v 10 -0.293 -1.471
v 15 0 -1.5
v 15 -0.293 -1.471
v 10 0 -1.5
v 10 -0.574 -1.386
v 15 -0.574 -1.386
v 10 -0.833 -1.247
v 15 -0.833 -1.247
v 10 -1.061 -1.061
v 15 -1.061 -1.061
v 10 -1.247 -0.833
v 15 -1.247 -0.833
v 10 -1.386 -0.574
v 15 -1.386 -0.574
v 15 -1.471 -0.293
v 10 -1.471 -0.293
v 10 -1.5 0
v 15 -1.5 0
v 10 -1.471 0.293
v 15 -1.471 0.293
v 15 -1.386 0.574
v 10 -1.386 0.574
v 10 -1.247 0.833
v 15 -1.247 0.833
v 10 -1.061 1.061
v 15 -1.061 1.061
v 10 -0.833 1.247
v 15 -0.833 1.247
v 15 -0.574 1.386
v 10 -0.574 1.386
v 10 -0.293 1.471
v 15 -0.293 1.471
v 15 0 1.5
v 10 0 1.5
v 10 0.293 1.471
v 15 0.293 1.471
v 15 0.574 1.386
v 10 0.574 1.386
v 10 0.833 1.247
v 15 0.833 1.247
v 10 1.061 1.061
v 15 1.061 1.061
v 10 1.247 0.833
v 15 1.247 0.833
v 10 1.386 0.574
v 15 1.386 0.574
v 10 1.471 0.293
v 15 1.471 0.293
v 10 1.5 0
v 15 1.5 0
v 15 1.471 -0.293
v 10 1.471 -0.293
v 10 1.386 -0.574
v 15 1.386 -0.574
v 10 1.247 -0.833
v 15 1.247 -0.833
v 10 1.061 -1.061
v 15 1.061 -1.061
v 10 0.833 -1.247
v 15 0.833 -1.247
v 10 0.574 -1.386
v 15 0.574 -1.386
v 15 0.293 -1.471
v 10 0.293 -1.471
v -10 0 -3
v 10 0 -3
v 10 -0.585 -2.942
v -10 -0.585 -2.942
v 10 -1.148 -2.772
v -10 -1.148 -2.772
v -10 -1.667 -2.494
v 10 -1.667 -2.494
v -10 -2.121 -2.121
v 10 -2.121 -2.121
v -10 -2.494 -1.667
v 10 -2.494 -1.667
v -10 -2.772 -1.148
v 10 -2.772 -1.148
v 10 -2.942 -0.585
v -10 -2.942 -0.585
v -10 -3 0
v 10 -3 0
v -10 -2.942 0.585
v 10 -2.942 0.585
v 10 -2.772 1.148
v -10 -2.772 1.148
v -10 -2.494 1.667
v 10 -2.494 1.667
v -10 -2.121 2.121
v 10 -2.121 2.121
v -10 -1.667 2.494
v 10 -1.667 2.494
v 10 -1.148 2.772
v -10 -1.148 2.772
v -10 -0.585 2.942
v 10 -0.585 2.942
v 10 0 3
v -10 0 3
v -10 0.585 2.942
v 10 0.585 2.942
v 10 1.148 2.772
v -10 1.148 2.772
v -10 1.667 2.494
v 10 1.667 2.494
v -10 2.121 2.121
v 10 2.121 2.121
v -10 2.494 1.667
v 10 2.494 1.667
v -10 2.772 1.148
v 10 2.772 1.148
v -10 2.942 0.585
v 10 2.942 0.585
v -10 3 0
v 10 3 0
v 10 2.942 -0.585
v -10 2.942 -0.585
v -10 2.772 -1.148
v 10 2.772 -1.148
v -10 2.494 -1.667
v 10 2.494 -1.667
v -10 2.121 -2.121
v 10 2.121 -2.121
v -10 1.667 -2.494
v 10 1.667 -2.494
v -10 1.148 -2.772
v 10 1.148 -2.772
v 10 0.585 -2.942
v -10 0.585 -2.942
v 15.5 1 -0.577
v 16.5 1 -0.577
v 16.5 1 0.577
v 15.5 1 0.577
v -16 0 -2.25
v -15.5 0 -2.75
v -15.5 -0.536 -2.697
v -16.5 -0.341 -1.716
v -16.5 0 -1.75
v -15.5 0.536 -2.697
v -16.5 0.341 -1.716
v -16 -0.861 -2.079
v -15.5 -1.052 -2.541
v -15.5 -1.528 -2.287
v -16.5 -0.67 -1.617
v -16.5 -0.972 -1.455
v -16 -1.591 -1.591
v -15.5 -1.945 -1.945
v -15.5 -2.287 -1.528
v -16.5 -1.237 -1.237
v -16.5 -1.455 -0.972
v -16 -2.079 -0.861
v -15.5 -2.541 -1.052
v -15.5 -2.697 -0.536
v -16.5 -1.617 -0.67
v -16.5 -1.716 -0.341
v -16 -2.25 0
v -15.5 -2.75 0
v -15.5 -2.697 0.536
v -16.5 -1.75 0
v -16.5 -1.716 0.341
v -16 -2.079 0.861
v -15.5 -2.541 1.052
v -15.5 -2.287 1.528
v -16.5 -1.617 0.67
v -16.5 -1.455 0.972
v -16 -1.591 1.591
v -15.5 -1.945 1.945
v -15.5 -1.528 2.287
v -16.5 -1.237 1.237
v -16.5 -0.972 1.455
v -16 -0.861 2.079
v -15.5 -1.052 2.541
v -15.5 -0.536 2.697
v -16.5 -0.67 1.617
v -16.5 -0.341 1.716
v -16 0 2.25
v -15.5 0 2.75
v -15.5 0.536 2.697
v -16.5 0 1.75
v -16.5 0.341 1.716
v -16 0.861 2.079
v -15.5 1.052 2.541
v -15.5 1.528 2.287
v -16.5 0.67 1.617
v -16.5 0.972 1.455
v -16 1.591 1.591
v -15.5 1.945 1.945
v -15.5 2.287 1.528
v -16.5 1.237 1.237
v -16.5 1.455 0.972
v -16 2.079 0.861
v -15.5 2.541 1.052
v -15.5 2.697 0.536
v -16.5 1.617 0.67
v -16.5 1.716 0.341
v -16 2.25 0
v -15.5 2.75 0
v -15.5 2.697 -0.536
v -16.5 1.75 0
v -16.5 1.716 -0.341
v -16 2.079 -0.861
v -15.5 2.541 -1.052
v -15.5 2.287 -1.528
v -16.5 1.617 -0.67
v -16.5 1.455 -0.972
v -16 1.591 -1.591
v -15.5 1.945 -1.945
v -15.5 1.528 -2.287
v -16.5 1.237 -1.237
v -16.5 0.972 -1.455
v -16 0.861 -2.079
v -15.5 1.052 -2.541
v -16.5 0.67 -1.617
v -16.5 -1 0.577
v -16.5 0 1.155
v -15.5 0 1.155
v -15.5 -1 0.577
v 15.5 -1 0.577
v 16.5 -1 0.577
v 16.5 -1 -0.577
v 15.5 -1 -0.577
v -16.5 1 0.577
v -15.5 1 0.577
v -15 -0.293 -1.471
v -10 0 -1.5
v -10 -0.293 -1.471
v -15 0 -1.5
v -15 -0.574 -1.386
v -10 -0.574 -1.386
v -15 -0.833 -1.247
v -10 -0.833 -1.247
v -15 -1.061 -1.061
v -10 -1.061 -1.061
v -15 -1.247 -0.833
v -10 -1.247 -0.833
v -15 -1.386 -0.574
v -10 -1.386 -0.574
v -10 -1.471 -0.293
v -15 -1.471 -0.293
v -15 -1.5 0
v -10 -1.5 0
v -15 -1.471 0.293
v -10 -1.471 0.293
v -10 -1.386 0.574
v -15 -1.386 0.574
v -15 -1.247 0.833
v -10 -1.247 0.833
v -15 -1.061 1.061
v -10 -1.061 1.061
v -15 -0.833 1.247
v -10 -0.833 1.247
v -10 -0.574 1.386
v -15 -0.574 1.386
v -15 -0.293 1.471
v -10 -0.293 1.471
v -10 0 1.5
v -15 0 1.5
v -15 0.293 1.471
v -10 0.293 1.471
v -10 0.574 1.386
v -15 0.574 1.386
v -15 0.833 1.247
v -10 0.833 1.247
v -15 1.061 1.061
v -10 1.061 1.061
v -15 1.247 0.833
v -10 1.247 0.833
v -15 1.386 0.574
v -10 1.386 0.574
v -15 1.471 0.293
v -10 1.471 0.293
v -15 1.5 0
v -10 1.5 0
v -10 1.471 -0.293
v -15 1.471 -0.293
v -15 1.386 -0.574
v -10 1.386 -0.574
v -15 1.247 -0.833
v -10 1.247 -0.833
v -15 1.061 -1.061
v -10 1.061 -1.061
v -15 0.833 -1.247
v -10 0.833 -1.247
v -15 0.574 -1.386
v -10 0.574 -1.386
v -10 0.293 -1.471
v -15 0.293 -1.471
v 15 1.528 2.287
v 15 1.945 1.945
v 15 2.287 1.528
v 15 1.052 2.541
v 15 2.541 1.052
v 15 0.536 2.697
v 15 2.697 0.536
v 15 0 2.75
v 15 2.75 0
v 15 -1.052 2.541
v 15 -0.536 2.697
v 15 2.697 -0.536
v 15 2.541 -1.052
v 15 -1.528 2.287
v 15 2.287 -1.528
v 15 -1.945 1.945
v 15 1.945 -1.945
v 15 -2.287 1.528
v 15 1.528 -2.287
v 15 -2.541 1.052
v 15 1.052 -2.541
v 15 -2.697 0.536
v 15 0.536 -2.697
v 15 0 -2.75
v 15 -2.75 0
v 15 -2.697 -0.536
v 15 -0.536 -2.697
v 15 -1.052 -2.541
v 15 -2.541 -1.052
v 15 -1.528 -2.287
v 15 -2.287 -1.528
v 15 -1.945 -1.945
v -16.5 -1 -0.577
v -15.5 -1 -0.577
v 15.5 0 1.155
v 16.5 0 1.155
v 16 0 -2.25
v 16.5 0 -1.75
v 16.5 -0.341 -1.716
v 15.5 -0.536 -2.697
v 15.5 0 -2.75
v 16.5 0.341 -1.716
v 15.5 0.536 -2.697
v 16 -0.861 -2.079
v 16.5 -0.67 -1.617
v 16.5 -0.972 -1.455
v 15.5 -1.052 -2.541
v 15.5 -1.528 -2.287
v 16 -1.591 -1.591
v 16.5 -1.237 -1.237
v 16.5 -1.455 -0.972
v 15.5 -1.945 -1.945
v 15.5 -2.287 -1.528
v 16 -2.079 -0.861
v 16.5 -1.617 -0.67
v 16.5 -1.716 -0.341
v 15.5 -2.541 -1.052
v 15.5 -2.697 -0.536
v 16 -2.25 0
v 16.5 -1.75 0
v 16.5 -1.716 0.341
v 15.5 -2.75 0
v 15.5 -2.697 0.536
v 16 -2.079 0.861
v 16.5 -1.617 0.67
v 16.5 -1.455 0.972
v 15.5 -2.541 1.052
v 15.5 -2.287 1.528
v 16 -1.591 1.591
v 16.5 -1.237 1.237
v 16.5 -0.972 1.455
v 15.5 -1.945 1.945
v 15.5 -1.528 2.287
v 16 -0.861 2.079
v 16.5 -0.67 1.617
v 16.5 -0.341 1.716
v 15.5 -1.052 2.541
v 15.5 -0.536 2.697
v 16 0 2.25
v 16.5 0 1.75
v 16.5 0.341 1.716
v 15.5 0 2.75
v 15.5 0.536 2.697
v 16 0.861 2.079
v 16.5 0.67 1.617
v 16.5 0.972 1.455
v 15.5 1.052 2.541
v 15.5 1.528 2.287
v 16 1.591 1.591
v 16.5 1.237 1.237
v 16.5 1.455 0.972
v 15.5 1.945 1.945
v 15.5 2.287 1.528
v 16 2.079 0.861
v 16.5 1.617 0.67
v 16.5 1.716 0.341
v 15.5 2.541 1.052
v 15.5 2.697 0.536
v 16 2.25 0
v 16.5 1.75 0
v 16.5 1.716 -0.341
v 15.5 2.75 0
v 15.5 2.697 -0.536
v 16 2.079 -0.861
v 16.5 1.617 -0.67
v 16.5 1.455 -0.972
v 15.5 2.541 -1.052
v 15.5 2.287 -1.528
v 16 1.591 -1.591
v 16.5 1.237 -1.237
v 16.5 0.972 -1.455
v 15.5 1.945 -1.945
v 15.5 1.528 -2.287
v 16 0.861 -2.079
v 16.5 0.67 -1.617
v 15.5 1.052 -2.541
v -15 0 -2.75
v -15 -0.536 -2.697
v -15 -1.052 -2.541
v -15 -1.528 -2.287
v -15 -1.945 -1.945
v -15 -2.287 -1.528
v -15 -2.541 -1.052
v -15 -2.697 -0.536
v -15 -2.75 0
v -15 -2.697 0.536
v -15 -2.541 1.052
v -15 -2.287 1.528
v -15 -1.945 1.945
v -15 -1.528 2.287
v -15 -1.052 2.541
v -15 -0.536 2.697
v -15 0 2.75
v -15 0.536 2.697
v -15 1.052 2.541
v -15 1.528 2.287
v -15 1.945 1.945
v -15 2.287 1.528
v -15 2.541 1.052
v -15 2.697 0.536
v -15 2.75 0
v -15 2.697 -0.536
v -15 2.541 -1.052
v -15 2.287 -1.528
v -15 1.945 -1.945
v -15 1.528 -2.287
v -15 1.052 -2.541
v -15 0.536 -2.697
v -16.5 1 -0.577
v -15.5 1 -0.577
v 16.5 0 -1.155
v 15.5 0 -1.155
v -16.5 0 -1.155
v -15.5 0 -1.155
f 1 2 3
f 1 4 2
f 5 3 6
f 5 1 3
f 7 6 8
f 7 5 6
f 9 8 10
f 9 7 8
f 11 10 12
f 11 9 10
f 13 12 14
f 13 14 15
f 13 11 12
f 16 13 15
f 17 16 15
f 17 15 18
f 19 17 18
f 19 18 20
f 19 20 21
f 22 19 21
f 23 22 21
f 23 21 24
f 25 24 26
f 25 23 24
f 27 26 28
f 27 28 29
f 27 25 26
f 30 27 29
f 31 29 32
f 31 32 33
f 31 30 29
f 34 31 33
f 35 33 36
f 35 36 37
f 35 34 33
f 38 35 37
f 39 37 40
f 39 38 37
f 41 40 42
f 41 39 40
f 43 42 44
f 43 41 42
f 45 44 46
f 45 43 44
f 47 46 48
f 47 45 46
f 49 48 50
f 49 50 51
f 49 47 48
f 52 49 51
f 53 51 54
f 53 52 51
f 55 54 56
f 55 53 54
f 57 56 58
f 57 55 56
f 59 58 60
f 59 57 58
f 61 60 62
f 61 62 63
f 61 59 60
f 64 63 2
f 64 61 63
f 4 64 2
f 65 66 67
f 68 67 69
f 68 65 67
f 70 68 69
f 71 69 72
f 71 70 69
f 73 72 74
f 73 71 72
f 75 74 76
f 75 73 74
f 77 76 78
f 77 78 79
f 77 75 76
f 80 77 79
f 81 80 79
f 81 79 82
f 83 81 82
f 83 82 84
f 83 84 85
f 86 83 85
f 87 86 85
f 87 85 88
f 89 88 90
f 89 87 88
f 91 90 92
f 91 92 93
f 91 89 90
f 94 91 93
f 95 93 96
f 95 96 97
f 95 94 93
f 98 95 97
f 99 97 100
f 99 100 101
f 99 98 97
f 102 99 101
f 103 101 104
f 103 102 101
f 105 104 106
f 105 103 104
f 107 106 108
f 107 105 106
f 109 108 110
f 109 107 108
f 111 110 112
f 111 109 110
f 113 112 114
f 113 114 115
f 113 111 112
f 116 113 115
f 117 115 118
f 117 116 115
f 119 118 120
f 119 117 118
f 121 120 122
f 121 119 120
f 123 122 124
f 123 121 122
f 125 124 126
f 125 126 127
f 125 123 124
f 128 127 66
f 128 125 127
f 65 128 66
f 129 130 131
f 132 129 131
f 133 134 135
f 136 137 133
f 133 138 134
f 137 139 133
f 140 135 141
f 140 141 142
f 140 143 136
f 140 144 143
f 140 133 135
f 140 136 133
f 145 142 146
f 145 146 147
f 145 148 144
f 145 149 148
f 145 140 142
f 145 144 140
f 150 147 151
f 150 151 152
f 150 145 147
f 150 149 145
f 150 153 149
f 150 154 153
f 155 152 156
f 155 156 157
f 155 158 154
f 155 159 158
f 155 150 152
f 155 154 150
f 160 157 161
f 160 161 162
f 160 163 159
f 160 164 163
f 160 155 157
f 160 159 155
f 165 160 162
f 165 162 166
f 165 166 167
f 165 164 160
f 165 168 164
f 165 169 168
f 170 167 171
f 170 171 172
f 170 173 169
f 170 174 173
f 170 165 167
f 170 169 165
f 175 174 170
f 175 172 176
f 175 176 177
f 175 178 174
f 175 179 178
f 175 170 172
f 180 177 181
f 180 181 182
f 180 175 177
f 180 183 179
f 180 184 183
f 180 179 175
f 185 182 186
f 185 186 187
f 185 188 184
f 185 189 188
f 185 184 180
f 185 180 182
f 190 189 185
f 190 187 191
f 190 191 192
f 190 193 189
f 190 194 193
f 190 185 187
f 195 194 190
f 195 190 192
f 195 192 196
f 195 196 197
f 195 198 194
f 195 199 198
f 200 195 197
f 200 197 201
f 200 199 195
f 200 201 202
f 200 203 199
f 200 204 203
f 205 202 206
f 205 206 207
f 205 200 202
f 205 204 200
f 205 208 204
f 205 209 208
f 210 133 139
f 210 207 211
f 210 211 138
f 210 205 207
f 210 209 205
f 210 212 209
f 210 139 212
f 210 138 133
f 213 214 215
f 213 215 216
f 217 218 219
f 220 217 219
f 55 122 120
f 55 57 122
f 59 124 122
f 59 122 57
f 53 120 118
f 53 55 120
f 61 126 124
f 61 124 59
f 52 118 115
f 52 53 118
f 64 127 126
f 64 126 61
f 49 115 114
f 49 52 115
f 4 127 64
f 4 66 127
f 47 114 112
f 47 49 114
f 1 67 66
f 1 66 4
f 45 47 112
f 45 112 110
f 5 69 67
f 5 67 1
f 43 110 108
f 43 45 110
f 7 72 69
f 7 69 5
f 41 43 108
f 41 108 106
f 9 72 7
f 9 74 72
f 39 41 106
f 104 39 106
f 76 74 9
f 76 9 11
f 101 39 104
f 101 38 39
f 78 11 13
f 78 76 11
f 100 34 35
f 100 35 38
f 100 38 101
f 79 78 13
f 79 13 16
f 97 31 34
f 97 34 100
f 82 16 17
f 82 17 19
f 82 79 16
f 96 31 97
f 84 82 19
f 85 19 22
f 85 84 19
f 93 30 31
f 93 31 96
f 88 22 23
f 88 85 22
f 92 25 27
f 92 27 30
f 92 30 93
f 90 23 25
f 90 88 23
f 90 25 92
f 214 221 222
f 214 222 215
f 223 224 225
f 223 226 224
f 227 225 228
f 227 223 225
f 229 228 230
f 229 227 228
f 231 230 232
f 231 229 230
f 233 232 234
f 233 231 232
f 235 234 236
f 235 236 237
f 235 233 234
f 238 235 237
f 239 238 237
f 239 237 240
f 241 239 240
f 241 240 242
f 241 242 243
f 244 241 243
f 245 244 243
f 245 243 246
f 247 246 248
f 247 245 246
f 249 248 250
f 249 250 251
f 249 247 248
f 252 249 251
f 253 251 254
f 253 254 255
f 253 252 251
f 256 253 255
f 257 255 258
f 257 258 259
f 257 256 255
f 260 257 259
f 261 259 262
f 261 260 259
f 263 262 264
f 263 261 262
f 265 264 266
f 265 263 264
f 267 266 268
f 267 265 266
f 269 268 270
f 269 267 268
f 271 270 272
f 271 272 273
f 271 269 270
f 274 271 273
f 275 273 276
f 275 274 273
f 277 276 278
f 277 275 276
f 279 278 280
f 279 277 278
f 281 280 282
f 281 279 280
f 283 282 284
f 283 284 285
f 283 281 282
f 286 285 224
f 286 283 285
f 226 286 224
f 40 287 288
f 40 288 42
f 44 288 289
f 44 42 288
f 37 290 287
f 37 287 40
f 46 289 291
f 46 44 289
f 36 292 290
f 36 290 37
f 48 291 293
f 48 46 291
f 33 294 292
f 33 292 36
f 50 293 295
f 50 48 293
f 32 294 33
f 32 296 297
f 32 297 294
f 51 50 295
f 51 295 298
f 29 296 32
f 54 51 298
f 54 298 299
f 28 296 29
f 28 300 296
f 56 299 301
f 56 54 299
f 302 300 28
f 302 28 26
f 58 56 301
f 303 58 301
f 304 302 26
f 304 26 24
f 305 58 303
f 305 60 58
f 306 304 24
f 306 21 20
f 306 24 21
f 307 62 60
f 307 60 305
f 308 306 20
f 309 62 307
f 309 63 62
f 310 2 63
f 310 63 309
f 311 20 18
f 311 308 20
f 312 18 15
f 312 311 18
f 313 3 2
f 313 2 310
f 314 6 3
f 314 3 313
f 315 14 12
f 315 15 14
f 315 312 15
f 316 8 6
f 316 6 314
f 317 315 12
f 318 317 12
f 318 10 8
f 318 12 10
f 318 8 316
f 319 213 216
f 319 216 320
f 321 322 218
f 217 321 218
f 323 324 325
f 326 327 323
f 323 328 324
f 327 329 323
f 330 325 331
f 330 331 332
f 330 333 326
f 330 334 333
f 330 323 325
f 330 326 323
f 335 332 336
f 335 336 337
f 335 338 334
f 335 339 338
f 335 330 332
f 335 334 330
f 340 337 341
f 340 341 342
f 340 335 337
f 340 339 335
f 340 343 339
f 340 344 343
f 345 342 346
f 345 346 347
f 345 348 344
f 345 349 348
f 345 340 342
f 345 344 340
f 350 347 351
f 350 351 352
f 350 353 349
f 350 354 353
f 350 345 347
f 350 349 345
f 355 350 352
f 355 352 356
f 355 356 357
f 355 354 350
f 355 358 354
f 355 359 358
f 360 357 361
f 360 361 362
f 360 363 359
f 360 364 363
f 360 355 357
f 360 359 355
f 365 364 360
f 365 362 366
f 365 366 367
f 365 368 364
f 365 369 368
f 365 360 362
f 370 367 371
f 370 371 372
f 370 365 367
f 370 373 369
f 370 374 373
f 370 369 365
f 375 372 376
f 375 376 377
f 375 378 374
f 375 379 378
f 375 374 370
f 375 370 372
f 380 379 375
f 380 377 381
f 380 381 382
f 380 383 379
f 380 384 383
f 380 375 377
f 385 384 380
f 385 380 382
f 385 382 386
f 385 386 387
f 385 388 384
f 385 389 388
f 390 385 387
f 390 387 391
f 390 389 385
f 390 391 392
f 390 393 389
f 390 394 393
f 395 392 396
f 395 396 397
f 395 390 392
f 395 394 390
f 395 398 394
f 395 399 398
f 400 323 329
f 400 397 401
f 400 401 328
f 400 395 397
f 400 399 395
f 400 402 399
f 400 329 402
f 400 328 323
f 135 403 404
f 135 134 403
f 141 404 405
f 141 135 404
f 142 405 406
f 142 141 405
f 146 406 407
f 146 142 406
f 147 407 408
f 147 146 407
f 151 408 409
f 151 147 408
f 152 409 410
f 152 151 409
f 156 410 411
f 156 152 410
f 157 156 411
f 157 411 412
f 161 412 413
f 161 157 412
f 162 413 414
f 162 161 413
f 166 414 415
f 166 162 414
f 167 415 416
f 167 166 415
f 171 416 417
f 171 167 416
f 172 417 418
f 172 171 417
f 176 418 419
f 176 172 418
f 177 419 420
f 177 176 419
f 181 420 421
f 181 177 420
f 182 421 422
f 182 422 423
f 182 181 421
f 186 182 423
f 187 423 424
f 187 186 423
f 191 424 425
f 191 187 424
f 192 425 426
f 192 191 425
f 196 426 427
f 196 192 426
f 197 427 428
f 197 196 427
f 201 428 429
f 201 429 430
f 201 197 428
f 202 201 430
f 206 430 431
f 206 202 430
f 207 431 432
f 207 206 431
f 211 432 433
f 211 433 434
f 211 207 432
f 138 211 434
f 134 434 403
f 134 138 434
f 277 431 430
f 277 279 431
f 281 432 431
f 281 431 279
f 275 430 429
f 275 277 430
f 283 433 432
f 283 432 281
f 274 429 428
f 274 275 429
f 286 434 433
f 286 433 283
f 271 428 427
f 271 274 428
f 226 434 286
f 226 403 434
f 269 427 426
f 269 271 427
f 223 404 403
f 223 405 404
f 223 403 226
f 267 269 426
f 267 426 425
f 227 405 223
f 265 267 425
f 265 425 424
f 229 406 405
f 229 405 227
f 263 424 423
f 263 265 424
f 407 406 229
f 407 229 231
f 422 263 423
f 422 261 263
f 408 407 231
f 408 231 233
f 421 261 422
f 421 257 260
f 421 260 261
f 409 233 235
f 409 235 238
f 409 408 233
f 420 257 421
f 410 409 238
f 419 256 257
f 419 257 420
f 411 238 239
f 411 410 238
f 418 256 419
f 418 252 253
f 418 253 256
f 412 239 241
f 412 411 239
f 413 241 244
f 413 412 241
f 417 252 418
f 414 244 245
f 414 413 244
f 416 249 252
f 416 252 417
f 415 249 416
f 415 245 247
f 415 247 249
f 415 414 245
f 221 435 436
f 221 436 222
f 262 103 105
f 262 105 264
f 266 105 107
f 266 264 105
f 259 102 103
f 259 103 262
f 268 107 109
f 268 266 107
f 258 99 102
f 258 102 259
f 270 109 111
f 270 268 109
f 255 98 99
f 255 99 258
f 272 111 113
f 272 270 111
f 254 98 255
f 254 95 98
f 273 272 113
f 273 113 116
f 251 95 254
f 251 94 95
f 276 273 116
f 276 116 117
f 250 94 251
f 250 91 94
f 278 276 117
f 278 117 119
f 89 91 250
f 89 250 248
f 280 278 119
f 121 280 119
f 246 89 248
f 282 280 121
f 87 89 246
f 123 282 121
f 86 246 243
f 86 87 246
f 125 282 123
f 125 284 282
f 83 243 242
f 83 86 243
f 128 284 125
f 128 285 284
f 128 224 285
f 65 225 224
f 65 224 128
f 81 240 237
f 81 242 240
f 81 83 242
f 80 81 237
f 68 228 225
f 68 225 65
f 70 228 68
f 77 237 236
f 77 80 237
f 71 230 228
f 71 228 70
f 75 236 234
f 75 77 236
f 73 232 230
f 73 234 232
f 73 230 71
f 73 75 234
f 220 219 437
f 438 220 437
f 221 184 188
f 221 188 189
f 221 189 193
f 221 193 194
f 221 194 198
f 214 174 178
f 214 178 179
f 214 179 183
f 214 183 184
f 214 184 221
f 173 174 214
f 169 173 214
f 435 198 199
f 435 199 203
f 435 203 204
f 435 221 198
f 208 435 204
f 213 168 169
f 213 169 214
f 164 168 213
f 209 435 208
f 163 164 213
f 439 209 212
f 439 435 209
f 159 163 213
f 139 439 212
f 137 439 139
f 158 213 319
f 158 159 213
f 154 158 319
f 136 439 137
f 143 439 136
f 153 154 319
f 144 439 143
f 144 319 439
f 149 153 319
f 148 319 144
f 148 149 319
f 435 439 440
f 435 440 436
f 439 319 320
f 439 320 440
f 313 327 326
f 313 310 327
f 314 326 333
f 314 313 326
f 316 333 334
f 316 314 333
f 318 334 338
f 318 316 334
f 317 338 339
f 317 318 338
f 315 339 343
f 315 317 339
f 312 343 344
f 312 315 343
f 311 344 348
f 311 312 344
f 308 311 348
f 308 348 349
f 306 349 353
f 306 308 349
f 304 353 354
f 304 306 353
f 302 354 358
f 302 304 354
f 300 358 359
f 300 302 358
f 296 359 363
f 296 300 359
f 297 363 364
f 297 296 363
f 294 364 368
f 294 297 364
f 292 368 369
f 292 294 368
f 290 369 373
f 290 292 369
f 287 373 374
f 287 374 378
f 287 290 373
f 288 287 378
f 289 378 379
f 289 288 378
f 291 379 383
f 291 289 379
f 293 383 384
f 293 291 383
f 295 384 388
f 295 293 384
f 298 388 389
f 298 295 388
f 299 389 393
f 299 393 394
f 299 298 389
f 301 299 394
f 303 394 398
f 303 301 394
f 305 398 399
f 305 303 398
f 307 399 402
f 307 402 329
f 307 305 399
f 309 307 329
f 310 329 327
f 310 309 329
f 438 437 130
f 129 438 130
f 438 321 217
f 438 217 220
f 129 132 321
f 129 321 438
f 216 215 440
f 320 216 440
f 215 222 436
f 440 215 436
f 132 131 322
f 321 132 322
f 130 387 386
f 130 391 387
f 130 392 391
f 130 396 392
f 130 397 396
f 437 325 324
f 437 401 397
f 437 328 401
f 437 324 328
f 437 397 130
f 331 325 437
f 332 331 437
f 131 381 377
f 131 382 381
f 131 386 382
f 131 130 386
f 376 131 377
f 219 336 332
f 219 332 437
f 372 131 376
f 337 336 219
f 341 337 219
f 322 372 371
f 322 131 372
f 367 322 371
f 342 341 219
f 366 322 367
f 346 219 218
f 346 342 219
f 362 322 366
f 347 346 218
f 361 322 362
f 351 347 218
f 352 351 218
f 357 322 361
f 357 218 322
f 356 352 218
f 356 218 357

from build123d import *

# Parameters (mm, degrees)
ENL_V_MAT_EXTRU_1_DEPTH = 1


with BuildPart() as part:
    # Esquisse1 → Révolution1 (revolve)
    with BuildSketch(Plane.XY, mode=Mode.PRIVATE) as r_volution1_sk:
        Polygon((10, 3), (-10, 3), (-10, 1.5), (-15, 1.5), (-15, 2.75), (-15.5, 2.75), (-16.5, 1.75), (-16.5, 0), (16.5, 0), (16.5, 1.75), (15.5, 2.75), (15, 2.75), (15, 1.5), (10, 1.5), align=None)
    revolve(r_volution1_sk.sketch.rotate(Axis((0, 0, 0), (-1, 0, 0)), 90), axis=Axis((0, 0, 0), (-1, 0, 0)))

    # Esquisse2 → Enlèv. mat.-Extru.1 (cut)
    with BuildSketch(Plane(origin=(16.5, 0, 0), x_dir=(0, 0, -1), z_dir=(1, 0, 0))):
        Polygon((0.577350269, 1), (-0.577350269, 1), (-1.154700538, 0), (-0.577350269, -1), (0.577350269, -1), (1.154700538, 0), align=None)
    enl_v_mat_extru_1 = extrude(amount=-ENL_V_MAT_EXTRU_1_DEPTH, mode=Mode.SUBTRACT)

    # Symétrie1: Enlèv. mat.-Extru.1 across plane
    add(enl_v_mat_extru_1.mirror(Plane(origin=(0, 0, 0), x_dir=(0, 0, 1), z_dir=(1, 0, 0))), mode=Mode.SUBTRACT)


solid = part.part
